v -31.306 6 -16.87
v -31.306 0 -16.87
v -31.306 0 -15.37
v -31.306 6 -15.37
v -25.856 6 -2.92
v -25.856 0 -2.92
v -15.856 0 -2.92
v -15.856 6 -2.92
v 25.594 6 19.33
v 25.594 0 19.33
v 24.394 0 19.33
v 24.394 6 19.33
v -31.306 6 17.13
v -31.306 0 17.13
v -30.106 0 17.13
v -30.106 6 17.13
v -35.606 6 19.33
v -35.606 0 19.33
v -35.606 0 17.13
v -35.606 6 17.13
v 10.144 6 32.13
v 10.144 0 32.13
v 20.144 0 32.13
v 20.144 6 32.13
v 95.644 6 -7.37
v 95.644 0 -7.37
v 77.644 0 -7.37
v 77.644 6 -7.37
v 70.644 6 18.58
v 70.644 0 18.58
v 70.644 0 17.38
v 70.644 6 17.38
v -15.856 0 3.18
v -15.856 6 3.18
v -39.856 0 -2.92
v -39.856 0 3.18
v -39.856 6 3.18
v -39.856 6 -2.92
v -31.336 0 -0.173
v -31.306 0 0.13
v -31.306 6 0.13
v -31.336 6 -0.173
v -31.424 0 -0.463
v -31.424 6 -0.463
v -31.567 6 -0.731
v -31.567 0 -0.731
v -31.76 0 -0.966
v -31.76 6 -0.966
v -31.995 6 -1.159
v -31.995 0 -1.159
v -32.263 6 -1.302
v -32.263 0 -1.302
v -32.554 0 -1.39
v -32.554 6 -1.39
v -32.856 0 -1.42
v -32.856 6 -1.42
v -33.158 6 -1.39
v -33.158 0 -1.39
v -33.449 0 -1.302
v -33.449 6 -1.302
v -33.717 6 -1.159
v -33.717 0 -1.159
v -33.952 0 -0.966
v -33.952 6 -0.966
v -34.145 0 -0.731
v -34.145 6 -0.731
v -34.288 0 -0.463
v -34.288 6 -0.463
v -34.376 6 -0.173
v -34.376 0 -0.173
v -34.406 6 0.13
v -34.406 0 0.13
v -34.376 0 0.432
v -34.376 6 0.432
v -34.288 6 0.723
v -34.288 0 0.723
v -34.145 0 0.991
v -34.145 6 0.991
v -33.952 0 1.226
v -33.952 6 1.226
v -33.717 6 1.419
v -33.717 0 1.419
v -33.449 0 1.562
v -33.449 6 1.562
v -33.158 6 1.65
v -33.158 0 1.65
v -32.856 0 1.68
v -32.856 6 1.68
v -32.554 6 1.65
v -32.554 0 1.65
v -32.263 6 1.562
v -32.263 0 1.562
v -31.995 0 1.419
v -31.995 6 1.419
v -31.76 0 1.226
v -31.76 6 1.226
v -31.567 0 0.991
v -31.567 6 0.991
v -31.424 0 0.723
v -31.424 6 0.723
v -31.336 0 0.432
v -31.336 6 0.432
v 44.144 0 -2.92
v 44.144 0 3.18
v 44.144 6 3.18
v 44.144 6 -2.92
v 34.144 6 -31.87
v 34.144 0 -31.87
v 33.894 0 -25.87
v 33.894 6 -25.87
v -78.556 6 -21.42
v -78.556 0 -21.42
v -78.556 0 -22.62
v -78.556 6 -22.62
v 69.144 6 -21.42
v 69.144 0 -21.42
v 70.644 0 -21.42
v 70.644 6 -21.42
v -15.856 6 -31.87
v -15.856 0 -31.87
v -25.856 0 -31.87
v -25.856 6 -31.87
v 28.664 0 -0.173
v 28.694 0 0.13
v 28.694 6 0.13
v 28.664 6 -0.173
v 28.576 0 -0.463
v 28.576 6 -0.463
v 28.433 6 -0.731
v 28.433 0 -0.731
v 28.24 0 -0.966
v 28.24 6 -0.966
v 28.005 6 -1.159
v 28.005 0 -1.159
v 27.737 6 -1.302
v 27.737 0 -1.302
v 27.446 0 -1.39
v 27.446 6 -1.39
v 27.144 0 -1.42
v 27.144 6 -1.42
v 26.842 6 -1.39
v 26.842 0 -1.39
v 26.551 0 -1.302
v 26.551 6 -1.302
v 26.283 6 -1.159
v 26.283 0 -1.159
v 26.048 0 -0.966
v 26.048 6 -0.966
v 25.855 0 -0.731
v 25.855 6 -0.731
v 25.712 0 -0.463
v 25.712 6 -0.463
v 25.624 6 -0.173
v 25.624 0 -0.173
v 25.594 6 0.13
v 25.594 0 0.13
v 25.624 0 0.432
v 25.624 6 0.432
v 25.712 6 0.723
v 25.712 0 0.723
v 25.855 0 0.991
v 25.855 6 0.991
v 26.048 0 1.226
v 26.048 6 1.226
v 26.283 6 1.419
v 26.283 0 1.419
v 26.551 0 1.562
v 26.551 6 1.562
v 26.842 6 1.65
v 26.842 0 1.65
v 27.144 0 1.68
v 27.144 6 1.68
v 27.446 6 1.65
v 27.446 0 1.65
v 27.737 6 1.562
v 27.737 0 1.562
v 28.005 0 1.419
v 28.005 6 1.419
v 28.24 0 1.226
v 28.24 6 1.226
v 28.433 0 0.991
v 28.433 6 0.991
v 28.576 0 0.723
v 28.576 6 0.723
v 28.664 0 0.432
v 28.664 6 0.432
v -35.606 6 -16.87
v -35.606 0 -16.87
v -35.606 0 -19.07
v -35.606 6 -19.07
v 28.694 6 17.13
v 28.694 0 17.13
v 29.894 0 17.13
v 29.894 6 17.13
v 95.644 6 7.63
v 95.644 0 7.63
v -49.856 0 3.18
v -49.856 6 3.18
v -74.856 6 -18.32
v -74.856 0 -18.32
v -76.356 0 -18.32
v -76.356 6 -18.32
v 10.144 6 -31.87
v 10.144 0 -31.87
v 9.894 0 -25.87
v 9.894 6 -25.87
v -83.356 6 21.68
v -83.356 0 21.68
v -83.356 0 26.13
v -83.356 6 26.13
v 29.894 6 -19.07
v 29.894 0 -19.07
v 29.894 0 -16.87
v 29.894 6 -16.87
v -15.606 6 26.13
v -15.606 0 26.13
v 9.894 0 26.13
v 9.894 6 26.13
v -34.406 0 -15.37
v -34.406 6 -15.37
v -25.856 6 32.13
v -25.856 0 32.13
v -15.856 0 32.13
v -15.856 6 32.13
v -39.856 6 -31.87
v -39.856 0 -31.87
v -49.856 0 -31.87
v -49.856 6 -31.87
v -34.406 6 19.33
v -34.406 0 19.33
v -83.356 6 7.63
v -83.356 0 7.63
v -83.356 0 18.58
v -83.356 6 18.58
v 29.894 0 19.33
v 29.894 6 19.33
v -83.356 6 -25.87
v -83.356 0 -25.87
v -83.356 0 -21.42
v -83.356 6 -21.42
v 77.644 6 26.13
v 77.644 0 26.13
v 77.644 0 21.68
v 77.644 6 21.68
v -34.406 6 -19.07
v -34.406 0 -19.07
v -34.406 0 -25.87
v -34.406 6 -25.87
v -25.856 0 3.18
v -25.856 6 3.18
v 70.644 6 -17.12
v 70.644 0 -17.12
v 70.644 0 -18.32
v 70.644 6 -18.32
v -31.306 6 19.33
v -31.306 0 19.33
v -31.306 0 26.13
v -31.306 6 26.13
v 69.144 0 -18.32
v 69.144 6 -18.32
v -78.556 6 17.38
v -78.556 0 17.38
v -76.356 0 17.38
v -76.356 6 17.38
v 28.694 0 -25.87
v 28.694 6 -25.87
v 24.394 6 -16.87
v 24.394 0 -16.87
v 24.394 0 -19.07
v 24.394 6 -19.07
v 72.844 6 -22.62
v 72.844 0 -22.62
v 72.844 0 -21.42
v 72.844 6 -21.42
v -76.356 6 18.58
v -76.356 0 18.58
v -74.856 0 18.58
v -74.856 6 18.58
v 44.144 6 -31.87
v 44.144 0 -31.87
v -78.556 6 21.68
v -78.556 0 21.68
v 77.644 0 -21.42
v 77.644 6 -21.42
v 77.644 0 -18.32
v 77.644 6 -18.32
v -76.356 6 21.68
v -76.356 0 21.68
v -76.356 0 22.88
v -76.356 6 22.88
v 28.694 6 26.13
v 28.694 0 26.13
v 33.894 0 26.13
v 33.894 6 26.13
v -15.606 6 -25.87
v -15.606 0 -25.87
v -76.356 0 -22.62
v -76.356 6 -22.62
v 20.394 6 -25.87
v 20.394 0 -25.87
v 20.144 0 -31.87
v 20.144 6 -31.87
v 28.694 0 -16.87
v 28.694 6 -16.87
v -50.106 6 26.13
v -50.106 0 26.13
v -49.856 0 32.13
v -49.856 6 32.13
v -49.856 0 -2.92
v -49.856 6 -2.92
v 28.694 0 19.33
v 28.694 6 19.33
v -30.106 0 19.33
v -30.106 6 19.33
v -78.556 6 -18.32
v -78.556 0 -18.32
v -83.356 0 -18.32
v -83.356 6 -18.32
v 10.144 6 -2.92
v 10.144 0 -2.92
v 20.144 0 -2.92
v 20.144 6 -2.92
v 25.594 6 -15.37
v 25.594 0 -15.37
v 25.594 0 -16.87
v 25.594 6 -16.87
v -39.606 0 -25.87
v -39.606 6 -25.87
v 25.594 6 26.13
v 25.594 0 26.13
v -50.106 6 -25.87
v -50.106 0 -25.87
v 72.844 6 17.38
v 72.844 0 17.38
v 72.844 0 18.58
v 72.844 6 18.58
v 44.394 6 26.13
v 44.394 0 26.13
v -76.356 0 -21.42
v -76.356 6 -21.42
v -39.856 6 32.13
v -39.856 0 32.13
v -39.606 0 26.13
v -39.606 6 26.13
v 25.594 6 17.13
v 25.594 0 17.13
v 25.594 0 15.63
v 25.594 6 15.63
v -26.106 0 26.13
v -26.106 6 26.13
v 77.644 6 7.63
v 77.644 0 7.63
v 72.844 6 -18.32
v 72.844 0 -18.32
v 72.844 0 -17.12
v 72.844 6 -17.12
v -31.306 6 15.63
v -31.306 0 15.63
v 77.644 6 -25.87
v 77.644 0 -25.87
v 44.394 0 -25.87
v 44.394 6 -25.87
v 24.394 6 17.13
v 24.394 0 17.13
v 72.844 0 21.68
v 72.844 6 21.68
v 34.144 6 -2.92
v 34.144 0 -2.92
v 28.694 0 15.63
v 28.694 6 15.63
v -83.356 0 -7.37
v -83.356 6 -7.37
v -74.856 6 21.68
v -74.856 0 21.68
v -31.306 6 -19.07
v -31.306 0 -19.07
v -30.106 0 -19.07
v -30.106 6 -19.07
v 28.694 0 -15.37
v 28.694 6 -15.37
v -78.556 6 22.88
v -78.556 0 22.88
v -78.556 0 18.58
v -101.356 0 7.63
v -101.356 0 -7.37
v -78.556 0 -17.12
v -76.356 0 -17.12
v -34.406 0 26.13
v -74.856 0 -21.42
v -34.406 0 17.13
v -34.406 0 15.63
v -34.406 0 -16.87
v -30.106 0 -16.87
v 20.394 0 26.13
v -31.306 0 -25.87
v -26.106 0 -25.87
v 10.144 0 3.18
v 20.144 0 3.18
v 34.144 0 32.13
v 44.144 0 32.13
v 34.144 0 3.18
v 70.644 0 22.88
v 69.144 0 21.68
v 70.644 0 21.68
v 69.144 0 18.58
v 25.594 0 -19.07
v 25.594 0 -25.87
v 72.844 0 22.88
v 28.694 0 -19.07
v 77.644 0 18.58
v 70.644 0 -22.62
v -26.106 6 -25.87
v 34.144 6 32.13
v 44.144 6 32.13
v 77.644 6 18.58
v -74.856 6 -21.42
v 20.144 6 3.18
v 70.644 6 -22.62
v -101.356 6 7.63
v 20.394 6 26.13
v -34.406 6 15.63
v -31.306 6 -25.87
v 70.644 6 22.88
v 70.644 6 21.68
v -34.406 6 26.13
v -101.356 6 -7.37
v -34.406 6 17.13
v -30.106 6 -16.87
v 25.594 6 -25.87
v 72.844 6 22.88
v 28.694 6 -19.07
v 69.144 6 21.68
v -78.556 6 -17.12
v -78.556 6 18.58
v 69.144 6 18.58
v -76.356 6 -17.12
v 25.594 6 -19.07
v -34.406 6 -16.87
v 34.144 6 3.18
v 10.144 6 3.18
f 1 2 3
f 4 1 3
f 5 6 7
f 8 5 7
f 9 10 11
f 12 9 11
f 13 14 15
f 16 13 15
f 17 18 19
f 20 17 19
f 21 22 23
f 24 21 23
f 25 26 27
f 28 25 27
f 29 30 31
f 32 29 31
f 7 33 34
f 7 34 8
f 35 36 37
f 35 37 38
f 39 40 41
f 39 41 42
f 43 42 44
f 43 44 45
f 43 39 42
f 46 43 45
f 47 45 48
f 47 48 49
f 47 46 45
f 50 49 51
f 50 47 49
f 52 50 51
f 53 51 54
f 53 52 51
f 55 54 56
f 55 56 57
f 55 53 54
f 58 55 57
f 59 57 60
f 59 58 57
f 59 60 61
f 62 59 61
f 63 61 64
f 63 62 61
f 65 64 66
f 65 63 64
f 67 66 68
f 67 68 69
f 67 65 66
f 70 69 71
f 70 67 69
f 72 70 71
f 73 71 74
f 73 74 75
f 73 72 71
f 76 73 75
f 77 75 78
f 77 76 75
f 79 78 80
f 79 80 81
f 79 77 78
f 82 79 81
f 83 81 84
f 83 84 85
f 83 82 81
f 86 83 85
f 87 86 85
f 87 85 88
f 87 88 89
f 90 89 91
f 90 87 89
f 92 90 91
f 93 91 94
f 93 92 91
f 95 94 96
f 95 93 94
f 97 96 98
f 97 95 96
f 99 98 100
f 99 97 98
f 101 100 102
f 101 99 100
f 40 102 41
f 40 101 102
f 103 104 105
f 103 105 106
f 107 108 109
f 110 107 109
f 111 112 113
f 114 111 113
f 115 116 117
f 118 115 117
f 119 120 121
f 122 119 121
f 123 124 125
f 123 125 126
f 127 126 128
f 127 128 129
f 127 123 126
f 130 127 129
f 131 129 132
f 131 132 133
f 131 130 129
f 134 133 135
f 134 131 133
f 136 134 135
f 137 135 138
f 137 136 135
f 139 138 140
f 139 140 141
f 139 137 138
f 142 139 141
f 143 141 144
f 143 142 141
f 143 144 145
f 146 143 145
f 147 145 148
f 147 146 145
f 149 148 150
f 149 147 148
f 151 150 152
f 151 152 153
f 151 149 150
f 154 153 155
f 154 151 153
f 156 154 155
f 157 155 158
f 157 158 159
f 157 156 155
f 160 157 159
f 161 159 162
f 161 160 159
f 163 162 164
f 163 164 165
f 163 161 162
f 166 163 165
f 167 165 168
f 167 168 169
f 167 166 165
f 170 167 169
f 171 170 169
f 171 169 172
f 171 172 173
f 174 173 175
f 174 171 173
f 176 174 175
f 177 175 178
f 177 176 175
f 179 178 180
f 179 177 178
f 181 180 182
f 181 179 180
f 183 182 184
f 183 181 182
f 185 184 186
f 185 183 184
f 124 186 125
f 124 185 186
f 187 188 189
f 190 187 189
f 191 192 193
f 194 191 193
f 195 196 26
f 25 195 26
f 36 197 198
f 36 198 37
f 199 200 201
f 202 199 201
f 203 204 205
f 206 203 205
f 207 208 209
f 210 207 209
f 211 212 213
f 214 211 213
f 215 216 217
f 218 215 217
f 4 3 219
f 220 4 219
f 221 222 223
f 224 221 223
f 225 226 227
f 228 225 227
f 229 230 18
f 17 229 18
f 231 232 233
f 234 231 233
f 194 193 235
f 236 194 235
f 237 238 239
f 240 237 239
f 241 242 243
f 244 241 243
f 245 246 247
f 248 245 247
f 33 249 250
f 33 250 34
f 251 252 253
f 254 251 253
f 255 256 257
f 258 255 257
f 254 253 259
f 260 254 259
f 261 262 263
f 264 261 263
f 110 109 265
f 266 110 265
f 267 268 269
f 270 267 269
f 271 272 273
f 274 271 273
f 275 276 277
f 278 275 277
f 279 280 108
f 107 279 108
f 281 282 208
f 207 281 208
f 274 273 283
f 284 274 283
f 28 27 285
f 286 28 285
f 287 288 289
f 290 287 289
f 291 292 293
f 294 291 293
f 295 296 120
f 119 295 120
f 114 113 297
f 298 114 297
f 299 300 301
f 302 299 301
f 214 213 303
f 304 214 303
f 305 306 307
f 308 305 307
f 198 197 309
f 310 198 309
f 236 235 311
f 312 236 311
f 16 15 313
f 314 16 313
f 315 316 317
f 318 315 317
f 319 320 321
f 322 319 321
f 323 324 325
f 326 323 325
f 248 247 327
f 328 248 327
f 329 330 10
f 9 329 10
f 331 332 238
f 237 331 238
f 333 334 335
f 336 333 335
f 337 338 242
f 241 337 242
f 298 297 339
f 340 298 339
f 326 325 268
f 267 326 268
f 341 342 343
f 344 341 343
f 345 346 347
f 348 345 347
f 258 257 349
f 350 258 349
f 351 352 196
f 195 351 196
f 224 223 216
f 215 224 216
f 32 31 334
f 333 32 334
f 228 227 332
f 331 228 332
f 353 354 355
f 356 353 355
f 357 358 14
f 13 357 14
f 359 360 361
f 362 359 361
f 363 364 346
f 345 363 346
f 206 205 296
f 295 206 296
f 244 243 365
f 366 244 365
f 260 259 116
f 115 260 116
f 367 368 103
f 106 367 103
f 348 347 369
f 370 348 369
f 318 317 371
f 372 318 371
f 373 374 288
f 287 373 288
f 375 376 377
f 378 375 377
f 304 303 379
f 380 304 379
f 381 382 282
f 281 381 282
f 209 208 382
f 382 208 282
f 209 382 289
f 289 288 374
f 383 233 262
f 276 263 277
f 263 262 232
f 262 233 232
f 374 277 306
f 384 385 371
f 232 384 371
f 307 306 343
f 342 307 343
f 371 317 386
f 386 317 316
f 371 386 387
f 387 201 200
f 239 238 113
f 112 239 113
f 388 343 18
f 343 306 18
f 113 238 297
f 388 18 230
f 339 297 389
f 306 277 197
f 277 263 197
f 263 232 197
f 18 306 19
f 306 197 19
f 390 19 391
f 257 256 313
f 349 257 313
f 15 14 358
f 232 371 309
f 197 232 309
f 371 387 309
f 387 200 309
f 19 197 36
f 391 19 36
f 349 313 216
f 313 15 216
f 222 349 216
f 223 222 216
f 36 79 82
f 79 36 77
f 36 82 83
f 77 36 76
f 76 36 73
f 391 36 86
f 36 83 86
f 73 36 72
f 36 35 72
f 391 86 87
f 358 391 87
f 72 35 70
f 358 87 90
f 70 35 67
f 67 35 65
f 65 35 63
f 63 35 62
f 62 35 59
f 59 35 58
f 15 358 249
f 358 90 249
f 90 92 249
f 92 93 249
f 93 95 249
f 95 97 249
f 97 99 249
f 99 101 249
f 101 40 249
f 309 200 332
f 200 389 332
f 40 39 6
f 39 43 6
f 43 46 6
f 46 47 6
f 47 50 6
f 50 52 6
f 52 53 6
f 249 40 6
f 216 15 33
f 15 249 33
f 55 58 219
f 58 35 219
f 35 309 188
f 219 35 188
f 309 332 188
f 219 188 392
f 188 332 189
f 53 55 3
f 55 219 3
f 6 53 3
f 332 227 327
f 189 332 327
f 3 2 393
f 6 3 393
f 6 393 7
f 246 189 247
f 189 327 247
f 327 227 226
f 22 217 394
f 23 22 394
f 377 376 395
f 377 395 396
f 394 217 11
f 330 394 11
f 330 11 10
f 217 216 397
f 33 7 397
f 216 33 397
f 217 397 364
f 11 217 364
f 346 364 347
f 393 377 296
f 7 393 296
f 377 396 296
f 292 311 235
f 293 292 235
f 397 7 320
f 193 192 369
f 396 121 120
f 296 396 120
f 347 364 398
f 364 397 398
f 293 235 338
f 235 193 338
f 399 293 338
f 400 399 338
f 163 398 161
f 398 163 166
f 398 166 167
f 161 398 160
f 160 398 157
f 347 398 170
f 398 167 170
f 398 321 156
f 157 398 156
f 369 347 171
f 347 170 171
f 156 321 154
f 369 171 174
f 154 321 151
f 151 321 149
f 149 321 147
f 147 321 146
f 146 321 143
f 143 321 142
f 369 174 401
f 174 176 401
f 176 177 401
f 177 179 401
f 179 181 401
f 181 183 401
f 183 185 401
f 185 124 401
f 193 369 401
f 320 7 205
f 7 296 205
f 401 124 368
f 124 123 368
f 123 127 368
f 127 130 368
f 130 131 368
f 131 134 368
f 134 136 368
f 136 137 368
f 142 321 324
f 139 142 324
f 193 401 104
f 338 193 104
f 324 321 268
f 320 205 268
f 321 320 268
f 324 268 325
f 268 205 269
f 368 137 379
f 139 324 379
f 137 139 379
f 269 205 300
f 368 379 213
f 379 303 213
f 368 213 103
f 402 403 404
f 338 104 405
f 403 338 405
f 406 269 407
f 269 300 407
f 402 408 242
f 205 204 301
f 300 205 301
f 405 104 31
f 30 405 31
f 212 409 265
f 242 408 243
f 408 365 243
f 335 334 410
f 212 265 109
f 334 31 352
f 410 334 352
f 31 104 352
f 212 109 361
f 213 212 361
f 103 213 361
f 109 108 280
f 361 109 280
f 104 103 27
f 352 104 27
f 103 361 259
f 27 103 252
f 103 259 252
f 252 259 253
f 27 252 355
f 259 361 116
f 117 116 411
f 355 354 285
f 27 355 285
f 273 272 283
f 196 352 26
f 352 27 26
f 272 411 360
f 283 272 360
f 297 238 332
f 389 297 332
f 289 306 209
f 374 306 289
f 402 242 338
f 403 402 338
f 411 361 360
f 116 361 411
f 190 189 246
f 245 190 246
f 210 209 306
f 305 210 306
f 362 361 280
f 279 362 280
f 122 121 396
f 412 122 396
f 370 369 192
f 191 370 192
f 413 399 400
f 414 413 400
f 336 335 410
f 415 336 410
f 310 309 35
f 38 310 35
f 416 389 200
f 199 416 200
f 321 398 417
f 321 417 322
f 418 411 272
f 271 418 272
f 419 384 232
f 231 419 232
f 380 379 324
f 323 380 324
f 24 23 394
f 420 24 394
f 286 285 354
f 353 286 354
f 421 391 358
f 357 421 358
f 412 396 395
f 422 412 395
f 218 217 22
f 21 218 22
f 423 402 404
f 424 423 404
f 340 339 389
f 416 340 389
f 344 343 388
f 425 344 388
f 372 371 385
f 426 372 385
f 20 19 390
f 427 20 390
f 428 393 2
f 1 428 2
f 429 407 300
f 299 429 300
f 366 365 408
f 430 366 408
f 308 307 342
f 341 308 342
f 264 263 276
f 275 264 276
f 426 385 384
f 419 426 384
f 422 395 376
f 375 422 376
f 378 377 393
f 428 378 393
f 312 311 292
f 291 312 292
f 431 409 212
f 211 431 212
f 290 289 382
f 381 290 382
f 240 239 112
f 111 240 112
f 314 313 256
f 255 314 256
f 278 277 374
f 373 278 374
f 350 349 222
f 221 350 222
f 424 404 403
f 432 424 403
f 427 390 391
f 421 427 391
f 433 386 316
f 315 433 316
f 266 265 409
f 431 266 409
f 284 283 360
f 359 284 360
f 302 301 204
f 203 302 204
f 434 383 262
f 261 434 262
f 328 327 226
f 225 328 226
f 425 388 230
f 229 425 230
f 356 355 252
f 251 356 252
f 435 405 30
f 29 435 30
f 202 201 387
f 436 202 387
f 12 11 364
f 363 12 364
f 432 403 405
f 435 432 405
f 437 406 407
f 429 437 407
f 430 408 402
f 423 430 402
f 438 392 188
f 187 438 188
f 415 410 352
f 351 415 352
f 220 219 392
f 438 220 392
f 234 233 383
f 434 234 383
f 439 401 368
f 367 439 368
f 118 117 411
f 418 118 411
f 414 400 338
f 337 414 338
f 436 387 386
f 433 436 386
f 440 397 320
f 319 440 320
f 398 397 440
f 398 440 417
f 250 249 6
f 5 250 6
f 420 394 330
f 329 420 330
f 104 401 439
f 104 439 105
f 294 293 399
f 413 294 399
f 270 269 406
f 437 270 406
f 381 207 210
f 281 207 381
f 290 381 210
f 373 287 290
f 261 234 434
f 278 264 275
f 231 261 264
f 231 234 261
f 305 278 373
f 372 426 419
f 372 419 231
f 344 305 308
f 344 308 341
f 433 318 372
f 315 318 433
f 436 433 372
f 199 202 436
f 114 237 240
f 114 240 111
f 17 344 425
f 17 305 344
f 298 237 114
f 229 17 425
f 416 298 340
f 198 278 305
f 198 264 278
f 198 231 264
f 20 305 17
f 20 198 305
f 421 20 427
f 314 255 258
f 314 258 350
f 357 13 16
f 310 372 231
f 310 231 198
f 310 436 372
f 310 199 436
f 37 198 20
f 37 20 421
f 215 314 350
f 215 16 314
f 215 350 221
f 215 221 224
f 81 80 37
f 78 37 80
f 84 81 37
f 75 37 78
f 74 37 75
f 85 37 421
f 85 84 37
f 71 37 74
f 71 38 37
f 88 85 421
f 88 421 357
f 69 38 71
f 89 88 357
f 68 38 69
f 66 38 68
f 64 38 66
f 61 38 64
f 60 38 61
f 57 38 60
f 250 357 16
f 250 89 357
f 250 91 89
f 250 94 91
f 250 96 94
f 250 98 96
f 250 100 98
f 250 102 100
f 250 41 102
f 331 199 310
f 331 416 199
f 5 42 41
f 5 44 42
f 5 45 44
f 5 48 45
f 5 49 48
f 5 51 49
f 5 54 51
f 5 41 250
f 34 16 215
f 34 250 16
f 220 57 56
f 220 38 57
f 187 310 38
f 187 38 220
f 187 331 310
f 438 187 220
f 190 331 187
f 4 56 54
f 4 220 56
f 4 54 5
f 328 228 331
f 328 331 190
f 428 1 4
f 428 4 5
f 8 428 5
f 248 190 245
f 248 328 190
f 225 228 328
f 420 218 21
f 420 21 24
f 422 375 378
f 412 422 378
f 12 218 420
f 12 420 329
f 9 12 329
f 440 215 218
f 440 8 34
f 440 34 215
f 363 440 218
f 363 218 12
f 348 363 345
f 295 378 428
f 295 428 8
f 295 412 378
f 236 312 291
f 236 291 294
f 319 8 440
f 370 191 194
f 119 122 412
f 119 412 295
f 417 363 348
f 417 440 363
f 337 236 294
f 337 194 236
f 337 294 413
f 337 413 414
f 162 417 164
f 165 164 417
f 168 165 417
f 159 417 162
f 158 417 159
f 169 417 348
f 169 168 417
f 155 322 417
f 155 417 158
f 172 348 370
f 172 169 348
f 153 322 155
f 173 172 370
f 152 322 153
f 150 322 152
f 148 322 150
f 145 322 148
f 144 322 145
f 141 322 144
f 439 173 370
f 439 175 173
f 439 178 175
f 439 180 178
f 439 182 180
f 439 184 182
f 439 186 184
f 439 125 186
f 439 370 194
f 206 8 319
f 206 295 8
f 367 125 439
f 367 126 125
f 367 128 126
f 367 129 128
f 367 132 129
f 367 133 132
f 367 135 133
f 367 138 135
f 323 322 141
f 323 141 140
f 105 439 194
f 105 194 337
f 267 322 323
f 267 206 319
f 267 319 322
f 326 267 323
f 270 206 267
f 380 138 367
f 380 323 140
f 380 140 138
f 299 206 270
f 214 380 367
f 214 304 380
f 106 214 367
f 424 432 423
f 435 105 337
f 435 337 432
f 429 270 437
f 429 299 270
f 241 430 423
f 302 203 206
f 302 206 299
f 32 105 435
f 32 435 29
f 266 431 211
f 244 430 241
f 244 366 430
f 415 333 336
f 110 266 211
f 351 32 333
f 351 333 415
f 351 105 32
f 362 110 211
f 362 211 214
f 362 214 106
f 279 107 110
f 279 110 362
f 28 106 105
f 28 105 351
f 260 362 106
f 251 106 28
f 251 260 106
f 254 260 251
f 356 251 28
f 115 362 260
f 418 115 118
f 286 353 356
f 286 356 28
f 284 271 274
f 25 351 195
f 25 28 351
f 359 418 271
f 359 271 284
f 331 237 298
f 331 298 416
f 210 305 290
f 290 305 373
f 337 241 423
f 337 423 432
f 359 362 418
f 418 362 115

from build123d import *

# Parameters (mm, degrees)
SKETCH_1_R      = 1.55
SKETCH_1_W      = 10
SKETCH_1_H      = 6.1
EXTRUDE_1_DEPTH = 6


with BuildPart() as part:
    # Эскиз1 → Бобышка-Вытянуть1 (new body)
    with BuildSketch(Plane(origin=(0, 0, 0), x_dir=(1, 0, 0), z_dir=(0, 1, 0))):
        Polygon((10.144022003, 31.870182818), (9.894022003, 25.870182818), (-15.605977997, 25.870182818), (-15.855977997, 31.870182818), (-25.855977997, 31.870182818), (-26.105977997, 25.870182818), (-31.305977997, 25.870182818), (-31.305977997, 19.070182818), (-30.105977997, 19.070182818), (-30.105977997, 16.870182818), (-31.305977997, 16.870182818), (-31.305977997, 15.370182818), (-34.405977997, 15.370182818), (-34.405977997, 16.870182818), (-35.605977997, 16.870182818), (-35.605977997, 19.070182818), (-34.405977997, 19.070182818), (-34.405977997, 25.870182818), (-39.605977997, 25.870182818), (-39.855977997, 31.870182818), (-49.855977997, 31.870182818), (-50.105977997, 25.870182818), (-83.355977997, 25.870182818), (-83.355977997, 21.420182818), (-78.555977997, 21.420182818), (-78.555977997, 22.620182818), (-76.355977997, 22.620182818), (-76.355977997, 21.420182818), (-74.855977997, 21.420182818), (-74.855977997, 18.320182818), (-76.355977997, 18.320182818), (-76.355977997, 17.120182818), (-78.555977997, 17.120182818), (-78.555977997, 18.320182818), (-83.355977997, 18.320182818), (-83.355977997, 7.370182818), (-101.355977997, 7.370182818), (-101.355977997, -7.629817182), (-83.355977997, -7.629817182), (-83.355977997, -18.579817182), (-78.555977997, -18.579817182), (-78.555977997, -17.379817182), (-76.355977997, -17.379817182), (-76.355977997, -18.579817182), (-74.855977997, -18.579817182), (-74.855977997, -21.679817182), (-76.355977997, -21.679817182), (-76.355977997, -22.879817182), (-78.555977997, -22.879817182), (-78.555977997, -21.679817182), (-83.355977997, -21.679817182), (-83.355977997, -26.129817182), (-50.105977997, -26.129817182), (-49.855977997, -32.129817182), (-39.855977997, -32.129817182), (-39.605977997, -26.129817182), (-34.405977997, -26.129817182), (-34.405977997, -19.329817182), (-35.605977997, -19.329817182), (-35.605977997, -17.129817182), (-34.405977997, -17.129817182), (-34.405977997, -15.629817182), (-31.305977997, -15.629817182), (-31.305977997, -17.129817182), (-30.105977997, -17.129817182), (-30.105977997, -19.329817182), (-31.305977997, -19.329817182), (-31.305977997, -26.129817182), (-26.105977997, -26.129817182), (-25.855977997, -32.129817182), (-15.855977997, -32.129817182), (-15.605977997, -26.129817182), (9.894022003, -26.129817182), (10.144022003, -32.129817182), (20.144022003, -32.129817182), (20.394022003, -26.129817182), (25.594022003, -26.129817182), (25.594022003, -19.329817182), (24.394022003, -19.329817182), (24.394022003, -17.129817182), (25.594022003, -17.129817182), (25.594022003, -15.629817182), (28.694022003, -15.629817182), (28.694022003, -17.129817182), (29.894022003, -17.129817182), (29.894022003, -19.329817182), (28.694022003, -19.329817182), (28.694022003, -26.129817182), (33.894022003, -26.129817182), (34.144022003, -32.129817182), (44.144022003, -32.129817182), (44.394022003, -26.129817182), (77.644022003, -26.129817182), (77.644022003, -21.679817182), (72.844022003, -21.679817182), (72.844022003, -22.879817182), (70.644022003, -22.879817182), (70.644022003, -21.679817182), (69.144022003, -21.679817182), (69.144022003, -18.579817182), (70.644022003, -18.579817182), (70.644022003, -17.379817182), (72.844022003, -17.379817182), (72.844022003, -18.579817182), (77.644022003, -18.579817182), (77.644022003, -7.629817182), (95.644022003, -7.629817182), (95.644022003, 7.370182818), (77.644022003, 7.370182818), (77.644022003, 18.320182818), (72.844022003, 18.320182818), (72.844022003, 17.120182818), (70.644022003, 17.120182818), (70.644022003, 18.320182818), (69.144022003, 18.320182818), (69.144022003, 21.420182818), (70.644022003, 21.420182818), (70.644022003, 22.620182818), (72.844022003, 22.620182818), (72.844022003, 21.420182818), (77.644022003, 21.420182818), (77.644022003, 25.870182818), (44.394022003, 25.870182818), (44.144022003, 31.870182818), (34.144022003, 31.870182818), (33.894022003, 25.870182818), (28.694022003, 25.870182818), (28.694022003, 19.070182818), (29.894022003, 19.070182818), (29.894022003, 16.870182818), (28.694022003, 16.870182818), (28.694022003, 15.370182818), (25.594022003, 15.370182818), (25.594022003, 16.870182818), (24.394022003, 16.870182818), (24.394022003, 19.070182818), (25.594022003, 19.070182818), (25.594022003, 25.870182818), (20.394022003, 25.870182818), (20.144022003, 31.870182818), align=None)
        with Locations((-32.855977997, -0.129817182)):
            Circle(SKETCH_1_R, mode=Mode.SUBTRACT)
        with Locations((27.144022003, -0.129817182)):
            Circle(SKETCH_1_R, mode=Mode.SUBTRACT)
        with Locations((-20.855977997, -0.129817182)):
            Rectangle(SKETCH_1_W, SKETCH_1_H, mode=Mode.SUBTRACT)
        with Locations((-44.855977997, -0.129817182)):
            Rectangle(SKETCH_1_W, SKETCH_1_H, mode=Mode.SUBTRACT)
        with Locations((15.144022003, -0.129817182)):
            Rectangle(SKETCH_1_W, SKETCH_1_H, mode=Mode.SUBTRACT)
        with Locations((39.144022003, -0.129817182)):
            Rectangle(SKETCH_1_W, SKETCH_1_H, mode=Mode.SUBTRACT)
    extrude(amount=EXTRUDE_1_DEPTH)


solid = part.part
